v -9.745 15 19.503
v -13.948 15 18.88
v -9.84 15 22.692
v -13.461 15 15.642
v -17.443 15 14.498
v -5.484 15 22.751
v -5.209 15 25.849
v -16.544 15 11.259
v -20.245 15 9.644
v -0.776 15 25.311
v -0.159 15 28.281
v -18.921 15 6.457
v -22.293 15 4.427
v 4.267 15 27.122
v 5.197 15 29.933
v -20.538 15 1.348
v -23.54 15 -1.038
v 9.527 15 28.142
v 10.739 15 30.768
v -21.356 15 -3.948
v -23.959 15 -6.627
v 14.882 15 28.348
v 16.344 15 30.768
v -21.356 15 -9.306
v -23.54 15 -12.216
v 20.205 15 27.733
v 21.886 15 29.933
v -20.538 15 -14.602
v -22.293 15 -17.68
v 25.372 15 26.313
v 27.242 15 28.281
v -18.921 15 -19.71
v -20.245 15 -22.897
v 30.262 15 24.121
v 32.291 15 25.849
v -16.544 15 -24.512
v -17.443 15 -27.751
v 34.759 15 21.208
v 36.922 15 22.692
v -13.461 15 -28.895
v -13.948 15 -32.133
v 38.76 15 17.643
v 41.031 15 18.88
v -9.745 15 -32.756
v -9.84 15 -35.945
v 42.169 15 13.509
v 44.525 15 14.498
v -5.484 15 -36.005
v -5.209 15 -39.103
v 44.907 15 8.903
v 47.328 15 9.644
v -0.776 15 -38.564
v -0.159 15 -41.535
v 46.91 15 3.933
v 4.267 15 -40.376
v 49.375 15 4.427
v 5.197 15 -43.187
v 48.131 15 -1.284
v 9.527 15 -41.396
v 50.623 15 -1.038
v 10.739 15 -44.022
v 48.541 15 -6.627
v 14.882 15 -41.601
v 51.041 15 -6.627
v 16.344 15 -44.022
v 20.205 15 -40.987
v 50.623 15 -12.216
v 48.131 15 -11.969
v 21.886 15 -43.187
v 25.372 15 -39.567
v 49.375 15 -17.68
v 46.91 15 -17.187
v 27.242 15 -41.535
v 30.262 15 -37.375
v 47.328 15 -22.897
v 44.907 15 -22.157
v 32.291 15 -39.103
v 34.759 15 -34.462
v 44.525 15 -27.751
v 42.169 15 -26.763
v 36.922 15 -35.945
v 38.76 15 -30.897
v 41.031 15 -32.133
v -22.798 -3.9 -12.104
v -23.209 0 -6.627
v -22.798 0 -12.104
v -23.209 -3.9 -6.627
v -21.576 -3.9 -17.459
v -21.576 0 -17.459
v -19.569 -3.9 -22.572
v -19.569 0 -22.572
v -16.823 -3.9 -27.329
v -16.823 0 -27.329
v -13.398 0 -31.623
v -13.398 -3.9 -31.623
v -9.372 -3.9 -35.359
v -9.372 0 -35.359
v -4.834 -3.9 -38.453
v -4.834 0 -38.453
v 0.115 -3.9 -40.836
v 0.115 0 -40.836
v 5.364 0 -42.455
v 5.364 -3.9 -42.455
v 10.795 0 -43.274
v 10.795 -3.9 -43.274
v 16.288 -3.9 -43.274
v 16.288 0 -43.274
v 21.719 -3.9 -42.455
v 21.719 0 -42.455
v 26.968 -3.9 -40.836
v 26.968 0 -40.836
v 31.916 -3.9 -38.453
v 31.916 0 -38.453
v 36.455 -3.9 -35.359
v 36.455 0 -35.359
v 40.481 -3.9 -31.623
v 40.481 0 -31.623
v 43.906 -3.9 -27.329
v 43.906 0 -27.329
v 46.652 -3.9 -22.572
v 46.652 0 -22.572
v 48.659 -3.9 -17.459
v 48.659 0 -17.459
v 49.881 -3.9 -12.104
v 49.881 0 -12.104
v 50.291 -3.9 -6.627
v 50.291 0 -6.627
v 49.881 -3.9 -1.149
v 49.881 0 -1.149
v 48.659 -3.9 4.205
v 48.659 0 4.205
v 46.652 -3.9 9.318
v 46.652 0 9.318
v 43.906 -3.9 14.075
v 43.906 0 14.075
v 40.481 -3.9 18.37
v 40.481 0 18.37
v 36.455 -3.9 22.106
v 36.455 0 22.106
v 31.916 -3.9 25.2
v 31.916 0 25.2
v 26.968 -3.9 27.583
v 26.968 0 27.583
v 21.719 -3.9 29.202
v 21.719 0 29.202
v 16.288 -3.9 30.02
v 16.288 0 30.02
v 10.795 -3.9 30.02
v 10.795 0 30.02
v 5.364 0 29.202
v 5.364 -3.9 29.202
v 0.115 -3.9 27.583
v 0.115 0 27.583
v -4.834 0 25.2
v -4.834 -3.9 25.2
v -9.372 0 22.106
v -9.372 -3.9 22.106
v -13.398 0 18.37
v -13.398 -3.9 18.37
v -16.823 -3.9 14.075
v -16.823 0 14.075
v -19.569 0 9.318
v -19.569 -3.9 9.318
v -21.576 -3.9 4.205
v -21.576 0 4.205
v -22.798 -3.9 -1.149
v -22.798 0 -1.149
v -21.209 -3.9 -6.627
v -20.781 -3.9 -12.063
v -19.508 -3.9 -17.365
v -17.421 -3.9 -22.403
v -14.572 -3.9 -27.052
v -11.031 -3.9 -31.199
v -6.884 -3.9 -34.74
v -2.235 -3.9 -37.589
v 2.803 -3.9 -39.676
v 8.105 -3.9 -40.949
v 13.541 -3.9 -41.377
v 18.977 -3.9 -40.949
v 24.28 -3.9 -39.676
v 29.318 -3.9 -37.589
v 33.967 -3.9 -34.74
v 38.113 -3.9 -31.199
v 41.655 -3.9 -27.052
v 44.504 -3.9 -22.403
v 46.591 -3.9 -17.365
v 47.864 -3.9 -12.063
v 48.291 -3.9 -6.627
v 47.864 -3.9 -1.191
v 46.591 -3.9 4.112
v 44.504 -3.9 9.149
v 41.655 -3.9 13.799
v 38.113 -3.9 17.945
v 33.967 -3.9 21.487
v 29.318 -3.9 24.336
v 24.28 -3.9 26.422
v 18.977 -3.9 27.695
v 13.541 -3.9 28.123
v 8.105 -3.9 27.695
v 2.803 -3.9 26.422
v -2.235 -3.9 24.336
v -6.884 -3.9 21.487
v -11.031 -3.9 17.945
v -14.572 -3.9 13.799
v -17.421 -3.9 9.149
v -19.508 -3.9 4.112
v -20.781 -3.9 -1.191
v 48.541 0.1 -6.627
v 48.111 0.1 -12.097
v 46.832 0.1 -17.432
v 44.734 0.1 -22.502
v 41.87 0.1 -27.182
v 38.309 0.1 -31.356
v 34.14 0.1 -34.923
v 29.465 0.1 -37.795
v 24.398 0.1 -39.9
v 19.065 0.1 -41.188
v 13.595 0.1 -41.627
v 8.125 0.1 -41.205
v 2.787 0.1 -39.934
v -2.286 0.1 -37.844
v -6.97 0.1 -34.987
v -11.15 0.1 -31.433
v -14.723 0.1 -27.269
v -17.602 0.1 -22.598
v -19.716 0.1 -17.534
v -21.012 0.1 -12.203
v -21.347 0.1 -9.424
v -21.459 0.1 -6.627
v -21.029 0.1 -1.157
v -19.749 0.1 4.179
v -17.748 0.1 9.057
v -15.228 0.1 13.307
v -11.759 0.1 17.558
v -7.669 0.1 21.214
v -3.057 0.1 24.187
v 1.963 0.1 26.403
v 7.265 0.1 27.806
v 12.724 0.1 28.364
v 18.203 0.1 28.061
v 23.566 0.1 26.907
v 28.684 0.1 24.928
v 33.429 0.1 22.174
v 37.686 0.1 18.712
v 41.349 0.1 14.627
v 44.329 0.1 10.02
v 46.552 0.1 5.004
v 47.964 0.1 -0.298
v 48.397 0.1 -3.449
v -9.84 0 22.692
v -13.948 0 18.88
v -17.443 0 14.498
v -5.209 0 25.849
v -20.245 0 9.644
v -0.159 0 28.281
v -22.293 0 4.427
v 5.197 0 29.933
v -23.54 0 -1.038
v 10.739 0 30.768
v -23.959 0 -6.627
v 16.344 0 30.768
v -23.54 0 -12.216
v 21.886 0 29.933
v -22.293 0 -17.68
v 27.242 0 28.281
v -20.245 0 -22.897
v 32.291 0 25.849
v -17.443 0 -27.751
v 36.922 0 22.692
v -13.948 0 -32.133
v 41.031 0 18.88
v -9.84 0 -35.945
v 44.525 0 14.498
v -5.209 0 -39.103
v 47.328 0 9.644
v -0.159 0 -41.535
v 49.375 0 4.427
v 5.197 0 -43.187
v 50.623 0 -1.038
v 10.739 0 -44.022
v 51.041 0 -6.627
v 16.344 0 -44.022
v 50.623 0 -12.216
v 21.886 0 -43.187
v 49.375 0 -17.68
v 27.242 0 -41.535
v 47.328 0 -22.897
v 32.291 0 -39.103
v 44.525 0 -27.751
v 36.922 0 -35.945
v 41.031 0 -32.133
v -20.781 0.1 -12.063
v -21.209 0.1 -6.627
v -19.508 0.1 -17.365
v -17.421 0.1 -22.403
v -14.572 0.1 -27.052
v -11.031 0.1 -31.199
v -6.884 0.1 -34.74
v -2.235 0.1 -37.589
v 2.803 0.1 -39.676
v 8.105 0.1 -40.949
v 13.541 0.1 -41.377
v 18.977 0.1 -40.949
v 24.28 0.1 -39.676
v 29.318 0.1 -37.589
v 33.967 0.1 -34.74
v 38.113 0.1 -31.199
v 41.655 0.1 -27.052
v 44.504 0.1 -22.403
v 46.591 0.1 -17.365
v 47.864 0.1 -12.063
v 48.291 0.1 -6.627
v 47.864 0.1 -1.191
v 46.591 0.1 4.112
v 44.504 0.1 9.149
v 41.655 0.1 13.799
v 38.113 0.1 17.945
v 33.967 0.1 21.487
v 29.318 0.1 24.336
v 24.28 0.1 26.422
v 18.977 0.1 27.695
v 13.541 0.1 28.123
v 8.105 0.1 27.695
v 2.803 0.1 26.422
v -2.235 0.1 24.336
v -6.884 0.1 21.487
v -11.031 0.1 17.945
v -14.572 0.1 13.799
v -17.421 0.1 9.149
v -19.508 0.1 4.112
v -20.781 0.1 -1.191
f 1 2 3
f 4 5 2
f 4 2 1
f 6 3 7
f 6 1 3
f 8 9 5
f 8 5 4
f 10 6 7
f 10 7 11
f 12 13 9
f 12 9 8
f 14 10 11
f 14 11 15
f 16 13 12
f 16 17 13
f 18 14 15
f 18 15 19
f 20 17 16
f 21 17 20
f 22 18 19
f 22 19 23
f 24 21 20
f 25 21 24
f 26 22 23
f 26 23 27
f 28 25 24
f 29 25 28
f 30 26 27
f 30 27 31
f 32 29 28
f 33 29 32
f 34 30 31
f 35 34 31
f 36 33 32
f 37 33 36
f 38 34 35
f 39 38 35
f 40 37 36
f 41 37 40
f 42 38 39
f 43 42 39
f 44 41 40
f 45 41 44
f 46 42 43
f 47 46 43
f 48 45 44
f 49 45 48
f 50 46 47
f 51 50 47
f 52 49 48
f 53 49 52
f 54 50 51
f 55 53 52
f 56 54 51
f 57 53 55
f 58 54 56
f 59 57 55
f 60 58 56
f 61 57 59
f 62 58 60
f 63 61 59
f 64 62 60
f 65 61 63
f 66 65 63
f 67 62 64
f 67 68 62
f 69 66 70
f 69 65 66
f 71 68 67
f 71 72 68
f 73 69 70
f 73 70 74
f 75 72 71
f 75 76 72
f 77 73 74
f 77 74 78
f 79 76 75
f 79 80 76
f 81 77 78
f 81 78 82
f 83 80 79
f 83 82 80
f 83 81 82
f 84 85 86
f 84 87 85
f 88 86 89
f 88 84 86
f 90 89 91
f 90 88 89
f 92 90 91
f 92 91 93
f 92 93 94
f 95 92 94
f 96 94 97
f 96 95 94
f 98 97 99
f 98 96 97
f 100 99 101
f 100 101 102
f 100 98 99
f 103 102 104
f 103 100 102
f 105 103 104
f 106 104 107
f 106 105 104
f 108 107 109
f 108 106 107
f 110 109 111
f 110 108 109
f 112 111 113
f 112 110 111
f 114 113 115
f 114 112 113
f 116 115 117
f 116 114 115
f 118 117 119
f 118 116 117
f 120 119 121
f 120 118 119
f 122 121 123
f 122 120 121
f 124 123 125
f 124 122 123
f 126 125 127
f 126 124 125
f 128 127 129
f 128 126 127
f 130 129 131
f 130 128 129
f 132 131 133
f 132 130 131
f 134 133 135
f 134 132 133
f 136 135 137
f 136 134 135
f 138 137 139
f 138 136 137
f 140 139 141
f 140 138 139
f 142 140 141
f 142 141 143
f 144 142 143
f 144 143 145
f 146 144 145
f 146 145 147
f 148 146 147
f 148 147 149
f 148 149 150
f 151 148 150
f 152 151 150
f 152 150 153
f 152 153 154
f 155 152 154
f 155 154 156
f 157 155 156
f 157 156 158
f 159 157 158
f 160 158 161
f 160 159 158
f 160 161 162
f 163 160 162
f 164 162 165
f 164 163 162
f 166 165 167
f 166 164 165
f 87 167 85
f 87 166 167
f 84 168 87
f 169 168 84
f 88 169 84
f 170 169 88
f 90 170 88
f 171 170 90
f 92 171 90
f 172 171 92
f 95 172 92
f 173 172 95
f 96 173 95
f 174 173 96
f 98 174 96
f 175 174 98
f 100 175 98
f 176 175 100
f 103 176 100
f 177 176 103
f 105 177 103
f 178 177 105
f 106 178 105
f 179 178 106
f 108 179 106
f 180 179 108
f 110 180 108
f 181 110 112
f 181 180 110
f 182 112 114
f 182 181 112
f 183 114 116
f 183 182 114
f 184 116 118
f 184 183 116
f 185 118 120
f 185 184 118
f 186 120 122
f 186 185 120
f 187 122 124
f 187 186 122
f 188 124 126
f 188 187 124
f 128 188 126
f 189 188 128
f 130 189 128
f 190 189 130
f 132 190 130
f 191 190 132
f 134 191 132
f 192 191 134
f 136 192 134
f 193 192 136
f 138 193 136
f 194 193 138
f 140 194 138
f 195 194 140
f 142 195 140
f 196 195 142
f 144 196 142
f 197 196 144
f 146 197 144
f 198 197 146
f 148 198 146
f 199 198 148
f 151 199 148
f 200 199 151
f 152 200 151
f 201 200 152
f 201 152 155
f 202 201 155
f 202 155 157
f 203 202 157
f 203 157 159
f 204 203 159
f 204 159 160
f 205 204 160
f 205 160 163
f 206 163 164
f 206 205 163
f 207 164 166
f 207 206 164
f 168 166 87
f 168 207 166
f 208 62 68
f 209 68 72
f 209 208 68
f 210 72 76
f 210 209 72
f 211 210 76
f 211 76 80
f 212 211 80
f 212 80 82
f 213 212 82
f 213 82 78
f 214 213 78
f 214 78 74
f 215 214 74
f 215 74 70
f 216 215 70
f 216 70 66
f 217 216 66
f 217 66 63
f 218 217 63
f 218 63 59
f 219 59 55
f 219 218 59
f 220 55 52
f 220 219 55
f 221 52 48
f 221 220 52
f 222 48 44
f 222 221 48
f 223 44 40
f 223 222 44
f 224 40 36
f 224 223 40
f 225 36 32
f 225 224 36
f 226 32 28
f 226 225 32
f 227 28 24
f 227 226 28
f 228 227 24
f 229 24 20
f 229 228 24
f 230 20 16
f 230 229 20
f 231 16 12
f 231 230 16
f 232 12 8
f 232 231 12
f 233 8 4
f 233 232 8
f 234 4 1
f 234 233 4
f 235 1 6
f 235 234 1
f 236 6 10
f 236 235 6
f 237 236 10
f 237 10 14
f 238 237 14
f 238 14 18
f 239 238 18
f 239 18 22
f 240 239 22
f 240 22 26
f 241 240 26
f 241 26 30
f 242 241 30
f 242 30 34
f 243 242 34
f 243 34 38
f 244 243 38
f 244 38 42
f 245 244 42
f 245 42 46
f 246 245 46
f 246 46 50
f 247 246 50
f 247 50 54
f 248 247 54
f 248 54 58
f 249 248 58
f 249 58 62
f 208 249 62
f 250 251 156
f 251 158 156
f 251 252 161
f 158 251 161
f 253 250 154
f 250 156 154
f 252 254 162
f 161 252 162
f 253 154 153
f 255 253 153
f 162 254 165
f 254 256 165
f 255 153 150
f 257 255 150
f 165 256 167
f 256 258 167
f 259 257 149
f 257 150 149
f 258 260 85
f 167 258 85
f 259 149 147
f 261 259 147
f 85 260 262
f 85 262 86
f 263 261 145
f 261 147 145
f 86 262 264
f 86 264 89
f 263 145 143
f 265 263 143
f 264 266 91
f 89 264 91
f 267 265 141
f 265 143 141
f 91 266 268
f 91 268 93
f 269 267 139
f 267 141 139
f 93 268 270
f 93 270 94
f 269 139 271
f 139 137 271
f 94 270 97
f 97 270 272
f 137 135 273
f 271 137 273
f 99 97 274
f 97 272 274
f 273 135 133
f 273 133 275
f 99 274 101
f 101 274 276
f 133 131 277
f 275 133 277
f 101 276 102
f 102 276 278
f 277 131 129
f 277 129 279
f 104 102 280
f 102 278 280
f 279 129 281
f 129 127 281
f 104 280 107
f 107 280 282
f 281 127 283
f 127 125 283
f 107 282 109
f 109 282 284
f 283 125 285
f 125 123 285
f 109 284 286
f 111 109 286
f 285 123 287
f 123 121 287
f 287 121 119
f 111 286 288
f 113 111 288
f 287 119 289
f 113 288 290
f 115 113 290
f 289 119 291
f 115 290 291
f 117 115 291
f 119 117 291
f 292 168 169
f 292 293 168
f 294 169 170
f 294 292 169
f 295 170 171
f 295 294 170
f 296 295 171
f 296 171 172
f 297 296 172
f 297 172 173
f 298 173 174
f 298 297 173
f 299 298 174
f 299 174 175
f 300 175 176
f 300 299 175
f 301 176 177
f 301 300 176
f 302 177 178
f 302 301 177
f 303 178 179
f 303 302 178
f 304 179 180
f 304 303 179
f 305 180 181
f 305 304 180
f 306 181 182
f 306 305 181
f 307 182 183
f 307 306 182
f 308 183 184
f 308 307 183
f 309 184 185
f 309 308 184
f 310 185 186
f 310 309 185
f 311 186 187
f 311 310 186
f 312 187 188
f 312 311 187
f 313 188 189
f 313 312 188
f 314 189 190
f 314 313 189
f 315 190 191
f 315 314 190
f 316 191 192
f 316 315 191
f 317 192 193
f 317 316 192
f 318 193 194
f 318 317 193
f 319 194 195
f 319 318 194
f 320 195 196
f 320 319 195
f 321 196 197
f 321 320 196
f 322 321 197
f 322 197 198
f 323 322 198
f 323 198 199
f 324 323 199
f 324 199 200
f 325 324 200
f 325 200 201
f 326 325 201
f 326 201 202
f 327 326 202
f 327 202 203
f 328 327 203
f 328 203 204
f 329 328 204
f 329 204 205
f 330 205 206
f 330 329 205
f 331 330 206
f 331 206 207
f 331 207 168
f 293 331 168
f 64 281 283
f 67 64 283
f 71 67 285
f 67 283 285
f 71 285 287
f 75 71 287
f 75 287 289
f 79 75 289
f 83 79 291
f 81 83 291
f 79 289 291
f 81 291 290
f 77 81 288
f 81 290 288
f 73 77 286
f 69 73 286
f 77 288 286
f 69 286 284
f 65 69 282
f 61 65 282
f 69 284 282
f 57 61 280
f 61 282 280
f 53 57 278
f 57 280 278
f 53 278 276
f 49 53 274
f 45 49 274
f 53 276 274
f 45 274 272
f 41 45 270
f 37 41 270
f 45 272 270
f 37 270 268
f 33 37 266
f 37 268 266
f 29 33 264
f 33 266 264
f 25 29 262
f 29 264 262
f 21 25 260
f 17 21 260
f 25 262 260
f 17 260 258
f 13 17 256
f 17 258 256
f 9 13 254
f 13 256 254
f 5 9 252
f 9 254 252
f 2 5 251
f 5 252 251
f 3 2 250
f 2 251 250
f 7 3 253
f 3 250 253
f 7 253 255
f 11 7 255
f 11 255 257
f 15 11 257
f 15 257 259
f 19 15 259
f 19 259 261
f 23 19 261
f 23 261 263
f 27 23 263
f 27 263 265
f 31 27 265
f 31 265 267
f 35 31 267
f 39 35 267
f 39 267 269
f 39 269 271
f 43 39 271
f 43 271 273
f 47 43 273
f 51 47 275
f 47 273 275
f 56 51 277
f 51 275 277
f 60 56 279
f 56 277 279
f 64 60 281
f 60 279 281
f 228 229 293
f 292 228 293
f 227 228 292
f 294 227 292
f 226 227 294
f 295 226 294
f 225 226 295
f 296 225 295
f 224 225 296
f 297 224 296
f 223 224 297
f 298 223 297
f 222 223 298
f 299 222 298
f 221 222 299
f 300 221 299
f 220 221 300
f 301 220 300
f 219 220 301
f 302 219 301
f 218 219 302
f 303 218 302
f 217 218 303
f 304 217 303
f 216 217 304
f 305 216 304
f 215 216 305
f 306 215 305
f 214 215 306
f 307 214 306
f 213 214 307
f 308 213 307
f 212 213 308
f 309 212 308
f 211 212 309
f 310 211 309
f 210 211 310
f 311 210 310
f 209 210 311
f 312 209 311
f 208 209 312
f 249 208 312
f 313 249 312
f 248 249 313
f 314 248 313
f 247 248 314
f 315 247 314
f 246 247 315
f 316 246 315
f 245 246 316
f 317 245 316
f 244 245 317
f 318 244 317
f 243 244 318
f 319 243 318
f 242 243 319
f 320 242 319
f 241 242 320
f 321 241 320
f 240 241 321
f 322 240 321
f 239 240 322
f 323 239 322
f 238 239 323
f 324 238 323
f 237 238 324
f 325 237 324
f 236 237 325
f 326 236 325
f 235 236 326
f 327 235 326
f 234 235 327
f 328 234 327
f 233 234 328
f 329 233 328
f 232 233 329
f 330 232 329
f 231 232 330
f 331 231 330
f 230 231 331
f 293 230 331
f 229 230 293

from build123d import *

# Parameters (mm, degrees)
CROQUIS1_R              = 37.5
CROQUIS1_R_2            = 35
SALIENTE_EXTRUIR1_DEPTH = 15
CROQUIS3_W              = 2
CROQUIS3_H              = 4


with BuildPart() as part:
    # Croquis1 → Saliente-Extruir1 (new body)
    with BuildSketch(Plane(origin=(0, 0, 0), x_dir=(1, 0, 0), z_dir=(0, 1, 0))):
        with Locations((13.541348433, 6.626768313)):
            Circle(CROQUIS1_R)
        with Locations((13.541348433, 6.626768313)):
            Circle(CROQUIS1_R_2, mode=Mode.SUBTRACT)
    extrude(amount=SALIENTE_EXTRUIR1_DEPTH)

    # Barrer1: sweep along a path in Croquis4
    with BuildLine(Plane(origin=(0, -1, 0), x_dir=(-1, 0, 0), z_dir=(0, -1, 0))) as barrer1_path:
        CenterArc((-13.541348433, 6.626768313), 36.25, 0, 360)
    # Croquis3 → Barrer1 (sweep)
    with BuildSketch(Plane.XY.offset(-6.626768313)):
        with Locations((-22.208651567, -1.9)):
            Rectangle(CROQUIS3_W, CROQUIS3_H)
    sweep(path=barrer1_path.line)


solid = part.part
